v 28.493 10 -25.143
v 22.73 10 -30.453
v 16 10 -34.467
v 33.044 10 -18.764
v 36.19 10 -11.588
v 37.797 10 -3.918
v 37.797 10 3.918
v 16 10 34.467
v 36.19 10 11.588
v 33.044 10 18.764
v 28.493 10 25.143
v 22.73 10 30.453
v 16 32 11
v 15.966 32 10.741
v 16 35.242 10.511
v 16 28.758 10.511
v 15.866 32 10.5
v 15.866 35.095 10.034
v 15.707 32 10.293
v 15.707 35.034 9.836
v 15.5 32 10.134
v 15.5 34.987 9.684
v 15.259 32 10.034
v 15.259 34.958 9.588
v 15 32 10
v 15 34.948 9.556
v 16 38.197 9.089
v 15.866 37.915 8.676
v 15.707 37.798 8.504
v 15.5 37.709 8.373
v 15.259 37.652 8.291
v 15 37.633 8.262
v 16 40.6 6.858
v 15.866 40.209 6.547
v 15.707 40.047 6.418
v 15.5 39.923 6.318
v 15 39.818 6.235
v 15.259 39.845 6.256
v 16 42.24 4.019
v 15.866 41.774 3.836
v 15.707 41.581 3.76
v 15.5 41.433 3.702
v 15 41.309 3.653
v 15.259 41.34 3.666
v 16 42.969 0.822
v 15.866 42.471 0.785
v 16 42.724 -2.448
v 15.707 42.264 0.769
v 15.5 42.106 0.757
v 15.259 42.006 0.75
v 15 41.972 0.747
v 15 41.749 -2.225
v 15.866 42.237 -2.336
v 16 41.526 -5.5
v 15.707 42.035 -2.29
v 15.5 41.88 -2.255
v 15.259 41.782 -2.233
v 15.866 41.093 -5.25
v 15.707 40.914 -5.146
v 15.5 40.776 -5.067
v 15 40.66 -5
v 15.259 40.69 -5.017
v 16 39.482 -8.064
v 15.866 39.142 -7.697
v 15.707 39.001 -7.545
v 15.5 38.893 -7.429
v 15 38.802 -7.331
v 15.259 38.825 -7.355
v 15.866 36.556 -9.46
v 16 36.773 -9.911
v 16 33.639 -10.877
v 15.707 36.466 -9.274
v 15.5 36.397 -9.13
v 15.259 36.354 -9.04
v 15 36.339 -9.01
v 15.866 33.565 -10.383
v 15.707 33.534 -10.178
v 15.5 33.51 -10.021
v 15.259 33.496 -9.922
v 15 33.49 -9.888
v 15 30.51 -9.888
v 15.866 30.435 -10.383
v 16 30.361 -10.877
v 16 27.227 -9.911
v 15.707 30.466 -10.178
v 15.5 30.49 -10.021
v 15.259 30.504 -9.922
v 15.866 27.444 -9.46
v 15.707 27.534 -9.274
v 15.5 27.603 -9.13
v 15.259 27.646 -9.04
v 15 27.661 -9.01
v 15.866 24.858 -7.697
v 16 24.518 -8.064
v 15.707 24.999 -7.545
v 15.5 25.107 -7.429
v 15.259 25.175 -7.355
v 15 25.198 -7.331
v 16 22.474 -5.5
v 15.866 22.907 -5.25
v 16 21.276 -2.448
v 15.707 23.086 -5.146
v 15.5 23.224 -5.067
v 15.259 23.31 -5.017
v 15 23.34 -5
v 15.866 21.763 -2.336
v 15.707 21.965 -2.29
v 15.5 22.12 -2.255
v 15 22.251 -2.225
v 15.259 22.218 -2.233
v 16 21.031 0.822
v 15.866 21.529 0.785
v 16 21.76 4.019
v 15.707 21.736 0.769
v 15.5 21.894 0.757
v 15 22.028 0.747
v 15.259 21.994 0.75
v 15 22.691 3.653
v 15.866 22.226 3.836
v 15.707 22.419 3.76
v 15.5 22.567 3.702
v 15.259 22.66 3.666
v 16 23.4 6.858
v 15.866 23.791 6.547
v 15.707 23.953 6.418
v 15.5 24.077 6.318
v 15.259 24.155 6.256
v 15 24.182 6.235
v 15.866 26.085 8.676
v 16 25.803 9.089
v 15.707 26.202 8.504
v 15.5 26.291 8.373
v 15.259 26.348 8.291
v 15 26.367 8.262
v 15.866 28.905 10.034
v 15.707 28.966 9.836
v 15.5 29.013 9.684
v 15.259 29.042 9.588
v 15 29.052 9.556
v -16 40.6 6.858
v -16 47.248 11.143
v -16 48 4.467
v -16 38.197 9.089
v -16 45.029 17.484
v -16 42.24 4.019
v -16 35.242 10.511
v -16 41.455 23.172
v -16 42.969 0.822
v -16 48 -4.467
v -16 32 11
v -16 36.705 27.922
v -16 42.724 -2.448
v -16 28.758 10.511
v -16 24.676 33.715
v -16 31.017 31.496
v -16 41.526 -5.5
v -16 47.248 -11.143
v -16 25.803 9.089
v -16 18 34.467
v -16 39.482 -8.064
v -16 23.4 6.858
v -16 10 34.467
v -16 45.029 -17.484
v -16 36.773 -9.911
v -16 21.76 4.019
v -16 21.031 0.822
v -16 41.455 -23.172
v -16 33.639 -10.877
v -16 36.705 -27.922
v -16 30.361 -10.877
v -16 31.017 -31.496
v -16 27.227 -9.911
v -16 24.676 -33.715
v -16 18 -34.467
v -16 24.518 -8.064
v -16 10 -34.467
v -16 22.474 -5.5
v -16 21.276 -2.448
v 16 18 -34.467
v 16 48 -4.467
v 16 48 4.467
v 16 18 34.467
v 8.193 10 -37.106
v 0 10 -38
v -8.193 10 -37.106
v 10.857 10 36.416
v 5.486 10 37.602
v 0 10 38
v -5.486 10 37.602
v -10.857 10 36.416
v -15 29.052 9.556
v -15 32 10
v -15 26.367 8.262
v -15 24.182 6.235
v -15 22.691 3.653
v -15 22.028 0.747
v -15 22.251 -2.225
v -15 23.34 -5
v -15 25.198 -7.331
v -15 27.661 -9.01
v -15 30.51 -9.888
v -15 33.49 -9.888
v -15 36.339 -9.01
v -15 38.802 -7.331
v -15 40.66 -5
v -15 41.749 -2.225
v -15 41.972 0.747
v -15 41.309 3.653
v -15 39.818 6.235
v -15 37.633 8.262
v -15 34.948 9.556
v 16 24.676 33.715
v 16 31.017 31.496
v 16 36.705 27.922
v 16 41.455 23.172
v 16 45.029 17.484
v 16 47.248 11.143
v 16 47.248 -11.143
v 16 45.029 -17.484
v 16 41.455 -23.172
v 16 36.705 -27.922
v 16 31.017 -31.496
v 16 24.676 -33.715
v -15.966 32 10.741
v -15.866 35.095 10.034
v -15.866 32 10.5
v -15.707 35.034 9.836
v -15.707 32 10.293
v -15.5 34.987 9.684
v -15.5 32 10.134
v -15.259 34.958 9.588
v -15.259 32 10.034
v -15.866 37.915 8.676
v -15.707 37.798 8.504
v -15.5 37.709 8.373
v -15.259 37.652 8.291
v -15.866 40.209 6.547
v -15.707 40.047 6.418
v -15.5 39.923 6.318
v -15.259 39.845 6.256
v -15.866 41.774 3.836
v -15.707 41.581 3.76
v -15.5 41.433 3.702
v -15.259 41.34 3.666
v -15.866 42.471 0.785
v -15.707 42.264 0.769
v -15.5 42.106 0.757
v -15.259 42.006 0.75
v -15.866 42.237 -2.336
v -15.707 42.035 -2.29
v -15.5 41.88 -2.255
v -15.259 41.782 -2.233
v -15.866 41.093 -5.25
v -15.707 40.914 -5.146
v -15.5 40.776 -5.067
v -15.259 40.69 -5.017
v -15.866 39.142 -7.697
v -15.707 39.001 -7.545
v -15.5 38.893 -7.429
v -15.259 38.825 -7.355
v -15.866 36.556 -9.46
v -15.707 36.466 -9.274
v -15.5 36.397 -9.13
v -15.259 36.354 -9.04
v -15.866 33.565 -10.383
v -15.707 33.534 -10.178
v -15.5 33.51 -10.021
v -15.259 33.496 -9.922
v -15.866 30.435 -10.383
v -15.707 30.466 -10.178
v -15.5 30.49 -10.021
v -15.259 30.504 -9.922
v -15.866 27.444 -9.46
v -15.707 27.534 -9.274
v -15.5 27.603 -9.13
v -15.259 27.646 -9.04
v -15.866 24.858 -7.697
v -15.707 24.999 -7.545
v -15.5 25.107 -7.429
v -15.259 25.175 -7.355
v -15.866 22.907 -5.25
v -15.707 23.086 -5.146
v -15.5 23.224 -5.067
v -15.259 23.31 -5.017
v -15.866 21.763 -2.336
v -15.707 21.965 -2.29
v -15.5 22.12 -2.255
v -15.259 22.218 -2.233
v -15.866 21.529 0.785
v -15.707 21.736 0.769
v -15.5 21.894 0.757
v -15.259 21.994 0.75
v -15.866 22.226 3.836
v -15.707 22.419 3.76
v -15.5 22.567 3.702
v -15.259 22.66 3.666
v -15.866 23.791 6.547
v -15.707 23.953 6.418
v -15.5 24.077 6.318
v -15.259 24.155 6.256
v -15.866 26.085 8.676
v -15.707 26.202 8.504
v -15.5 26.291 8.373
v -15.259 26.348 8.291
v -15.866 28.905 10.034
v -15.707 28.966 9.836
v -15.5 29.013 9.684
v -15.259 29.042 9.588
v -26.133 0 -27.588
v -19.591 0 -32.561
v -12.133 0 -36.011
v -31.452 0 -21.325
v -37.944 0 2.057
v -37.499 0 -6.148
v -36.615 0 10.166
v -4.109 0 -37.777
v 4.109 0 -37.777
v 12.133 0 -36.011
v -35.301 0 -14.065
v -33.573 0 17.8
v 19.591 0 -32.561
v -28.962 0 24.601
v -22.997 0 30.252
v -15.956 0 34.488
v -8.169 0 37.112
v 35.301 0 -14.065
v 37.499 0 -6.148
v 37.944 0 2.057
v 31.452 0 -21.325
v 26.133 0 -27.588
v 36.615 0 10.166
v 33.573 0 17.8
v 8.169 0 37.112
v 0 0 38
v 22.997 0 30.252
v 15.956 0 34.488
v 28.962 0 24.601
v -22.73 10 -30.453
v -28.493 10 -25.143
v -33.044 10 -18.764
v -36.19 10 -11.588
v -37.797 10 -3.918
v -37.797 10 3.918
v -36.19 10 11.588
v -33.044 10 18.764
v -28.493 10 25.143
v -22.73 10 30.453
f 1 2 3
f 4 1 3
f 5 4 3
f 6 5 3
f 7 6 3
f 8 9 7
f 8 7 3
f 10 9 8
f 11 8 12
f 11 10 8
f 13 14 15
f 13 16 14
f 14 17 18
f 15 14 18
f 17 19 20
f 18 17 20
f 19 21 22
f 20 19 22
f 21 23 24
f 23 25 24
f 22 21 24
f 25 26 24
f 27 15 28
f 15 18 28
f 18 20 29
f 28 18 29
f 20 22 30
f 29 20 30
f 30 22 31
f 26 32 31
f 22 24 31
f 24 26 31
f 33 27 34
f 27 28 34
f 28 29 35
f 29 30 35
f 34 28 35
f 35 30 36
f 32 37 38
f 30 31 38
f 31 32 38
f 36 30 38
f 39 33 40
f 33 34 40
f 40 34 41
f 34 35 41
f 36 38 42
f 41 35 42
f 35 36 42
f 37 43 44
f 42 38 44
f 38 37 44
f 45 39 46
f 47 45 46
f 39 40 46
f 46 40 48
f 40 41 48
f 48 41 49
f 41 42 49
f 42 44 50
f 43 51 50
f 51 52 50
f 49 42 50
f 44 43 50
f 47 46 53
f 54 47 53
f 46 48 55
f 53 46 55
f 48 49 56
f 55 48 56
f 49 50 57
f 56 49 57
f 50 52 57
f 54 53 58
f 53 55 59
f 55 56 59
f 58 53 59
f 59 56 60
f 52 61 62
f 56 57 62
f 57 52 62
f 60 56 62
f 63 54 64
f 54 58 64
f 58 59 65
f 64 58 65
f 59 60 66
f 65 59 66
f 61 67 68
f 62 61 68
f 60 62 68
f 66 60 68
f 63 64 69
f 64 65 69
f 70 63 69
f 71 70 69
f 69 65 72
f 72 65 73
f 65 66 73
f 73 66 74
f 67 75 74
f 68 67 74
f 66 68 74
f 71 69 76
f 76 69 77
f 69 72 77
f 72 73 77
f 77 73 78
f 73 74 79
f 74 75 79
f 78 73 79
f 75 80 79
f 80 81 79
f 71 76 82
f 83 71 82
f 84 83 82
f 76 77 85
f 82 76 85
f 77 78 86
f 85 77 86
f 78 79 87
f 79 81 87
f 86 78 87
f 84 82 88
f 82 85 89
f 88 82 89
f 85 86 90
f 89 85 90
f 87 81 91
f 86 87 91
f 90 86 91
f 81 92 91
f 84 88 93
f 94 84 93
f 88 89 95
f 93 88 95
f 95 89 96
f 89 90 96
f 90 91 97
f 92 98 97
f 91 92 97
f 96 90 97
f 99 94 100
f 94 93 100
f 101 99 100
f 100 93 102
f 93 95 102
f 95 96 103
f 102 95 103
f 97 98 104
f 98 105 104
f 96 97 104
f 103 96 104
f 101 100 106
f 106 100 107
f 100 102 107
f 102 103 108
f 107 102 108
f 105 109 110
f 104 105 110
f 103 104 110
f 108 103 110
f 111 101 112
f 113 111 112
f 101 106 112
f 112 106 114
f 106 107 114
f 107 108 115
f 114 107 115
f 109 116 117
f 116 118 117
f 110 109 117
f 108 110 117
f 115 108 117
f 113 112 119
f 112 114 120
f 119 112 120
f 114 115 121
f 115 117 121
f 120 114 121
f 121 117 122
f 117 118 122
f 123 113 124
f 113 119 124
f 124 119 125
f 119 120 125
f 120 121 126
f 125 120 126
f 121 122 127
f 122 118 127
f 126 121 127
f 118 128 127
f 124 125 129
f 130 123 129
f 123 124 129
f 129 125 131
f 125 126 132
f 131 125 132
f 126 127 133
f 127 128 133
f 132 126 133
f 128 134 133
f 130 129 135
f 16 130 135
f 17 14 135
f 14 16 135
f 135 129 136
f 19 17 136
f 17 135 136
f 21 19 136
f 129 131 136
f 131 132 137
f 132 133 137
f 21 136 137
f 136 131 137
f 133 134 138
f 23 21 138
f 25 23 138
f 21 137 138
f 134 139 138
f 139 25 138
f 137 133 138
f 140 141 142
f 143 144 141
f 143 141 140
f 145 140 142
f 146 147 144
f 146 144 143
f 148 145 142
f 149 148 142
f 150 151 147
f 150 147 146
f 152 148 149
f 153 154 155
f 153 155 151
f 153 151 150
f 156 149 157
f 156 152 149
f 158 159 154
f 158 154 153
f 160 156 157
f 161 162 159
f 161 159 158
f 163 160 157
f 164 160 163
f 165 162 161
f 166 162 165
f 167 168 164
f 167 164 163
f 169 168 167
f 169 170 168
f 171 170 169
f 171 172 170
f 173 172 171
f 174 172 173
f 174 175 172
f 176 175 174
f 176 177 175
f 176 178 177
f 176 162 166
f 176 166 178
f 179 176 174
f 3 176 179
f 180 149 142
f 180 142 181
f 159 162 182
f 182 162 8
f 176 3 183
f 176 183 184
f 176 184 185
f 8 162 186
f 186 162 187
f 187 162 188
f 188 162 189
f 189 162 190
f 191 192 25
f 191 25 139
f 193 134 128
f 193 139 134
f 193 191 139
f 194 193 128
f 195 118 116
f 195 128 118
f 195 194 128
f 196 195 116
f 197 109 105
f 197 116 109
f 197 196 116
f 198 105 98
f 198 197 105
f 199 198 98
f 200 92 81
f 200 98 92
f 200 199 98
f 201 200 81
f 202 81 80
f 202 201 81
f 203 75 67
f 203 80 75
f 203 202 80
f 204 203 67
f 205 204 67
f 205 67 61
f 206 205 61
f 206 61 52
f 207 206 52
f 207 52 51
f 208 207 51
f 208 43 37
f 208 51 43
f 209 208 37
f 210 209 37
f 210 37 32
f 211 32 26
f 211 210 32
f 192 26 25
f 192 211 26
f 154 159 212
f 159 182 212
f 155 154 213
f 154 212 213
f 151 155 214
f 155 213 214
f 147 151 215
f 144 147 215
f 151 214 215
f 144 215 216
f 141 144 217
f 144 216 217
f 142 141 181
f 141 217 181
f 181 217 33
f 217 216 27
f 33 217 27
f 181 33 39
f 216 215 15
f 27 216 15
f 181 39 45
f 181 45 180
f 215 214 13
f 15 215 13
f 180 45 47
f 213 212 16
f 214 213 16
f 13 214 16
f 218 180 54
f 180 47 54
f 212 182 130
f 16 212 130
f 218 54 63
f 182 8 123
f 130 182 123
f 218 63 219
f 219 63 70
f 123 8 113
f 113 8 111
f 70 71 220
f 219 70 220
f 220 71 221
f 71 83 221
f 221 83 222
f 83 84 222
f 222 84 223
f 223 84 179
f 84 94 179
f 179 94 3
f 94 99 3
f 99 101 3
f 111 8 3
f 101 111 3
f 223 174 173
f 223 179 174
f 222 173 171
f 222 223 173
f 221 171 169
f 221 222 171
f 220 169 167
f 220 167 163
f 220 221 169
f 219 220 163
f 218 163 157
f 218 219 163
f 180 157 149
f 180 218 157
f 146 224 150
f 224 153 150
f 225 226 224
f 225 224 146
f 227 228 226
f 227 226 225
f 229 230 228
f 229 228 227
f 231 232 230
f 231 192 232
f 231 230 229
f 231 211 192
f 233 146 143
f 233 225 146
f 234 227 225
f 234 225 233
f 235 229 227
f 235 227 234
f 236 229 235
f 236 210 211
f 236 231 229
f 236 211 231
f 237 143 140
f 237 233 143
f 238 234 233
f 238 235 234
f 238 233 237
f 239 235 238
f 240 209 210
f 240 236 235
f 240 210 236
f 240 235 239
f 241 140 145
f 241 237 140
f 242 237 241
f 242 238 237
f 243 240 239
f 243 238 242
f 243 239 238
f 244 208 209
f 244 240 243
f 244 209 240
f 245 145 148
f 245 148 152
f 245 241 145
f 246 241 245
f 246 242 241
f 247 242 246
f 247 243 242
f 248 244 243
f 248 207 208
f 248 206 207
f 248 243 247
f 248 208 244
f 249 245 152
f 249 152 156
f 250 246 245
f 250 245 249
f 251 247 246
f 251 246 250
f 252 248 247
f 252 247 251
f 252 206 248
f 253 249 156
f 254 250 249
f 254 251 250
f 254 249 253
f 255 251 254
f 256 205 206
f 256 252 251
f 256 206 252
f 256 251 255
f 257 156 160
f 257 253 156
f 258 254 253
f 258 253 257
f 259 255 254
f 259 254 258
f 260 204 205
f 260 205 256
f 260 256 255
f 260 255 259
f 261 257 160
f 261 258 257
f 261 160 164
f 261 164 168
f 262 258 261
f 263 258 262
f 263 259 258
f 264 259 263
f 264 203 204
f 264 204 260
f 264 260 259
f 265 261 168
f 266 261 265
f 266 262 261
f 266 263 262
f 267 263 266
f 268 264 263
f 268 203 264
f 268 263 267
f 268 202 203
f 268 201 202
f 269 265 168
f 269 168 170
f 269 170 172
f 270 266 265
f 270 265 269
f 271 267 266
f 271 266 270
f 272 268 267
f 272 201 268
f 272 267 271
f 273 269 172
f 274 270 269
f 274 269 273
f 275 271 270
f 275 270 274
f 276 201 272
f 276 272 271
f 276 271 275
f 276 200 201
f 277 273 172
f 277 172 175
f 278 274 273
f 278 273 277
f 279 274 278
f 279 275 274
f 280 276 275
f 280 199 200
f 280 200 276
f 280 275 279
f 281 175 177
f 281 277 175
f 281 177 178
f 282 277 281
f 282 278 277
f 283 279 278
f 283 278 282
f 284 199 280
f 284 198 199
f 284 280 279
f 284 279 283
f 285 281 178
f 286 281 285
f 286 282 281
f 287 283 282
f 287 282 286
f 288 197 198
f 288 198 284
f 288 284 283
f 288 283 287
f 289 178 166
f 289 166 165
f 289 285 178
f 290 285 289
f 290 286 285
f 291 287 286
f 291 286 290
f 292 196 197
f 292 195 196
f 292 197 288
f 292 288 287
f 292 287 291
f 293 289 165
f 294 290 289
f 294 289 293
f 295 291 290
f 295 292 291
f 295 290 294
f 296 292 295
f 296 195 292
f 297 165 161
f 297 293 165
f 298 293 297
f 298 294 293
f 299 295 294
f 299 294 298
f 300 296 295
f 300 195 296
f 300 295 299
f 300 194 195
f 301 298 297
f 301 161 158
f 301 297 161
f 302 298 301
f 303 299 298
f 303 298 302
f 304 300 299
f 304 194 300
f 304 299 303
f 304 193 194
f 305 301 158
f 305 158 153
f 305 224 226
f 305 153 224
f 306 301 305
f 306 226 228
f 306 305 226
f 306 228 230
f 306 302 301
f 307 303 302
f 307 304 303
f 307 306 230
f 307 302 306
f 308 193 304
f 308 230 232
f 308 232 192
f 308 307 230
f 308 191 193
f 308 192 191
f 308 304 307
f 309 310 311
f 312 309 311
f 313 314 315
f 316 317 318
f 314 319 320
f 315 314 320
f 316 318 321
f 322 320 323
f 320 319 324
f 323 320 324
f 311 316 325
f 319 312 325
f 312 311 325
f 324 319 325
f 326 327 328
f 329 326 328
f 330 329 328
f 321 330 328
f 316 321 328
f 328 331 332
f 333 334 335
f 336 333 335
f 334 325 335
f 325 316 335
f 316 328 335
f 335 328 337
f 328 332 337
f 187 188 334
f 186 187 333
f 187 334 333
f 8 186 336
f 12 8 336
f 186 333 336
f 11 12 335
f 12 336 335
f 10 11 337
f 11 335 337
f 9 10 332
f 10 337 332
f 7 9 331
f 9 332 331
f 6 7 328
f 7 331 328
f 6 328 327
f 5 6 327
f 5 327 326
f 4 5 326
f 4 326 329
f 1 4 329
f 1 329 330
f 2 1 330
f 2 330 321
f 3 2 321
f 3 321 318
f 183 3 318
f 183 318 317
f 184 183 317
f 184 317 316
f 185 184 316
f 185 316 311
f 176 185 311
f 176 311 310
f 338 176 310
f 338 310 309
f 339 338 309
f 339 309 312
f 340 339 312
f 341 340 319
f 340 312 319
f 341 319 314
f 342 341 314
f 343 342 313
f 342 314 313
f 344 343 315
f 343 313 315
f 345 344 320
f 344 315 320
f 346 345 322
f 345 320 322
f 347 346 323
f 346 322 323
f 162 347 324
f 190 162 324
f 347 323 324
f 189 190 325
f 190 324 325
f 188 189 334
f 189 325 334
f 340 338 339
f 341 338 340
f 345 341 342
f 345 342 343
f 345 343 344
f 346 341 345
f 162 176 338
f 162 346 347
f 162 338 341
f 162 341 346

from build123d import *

# Parameters (mm, degrees)
SKETCH1_R               = 38
BOSS_EXTRUDE1_DEPTH     = 10
SKETCH2_W               = 32
SKETCH2_H               = 68.934751758
BOSS_EXTRUDE2_DEPTH     = 38
CUT_EXTRUDE1_DEPTH      = 38
CUT_EXTRUDE1_DEPTH_BACK = 38
SKETCH3_R               = 10
FILLET3_R               = 30
FILLET6_R               = 1


with BuildPart() as part:
    # Sketch1 → Boss-Extrude1 (new body)
    with BuildSketch(Plane(origin=(0, 0, 0), x_dir=(1, 0, 0), z_dir=(0, 1, 0))):
        with Locations(Location((0, 0, 0), (0, 0, 270))):
            Circle(SKETCH1_R)
    extrude(amount=BOSS_EXTRUDE1_DEPTH)

    # Sketch2 → Boss-Extrude2 (add)
    with BuildSketch(Plane(origin=(0, 10, 0), x_dir=(1, 0, 0), z_dir=(0, 1, 0))):
        Rectangle(SKETCH2_W, SKETCH2_H)
    extrude(amount=BOSS_EXTRUDE2_DEPTH)

    # Sketch3 → Cut-Extrude1 (cut, two sides: drawn at the far end of the back side and taken through both)
    with BuildSketch(Plane(origin=(0, 0, 0), x_dir=(0, 0, -1), z_dir=(1, 0, 0)).offset(-CUT_EXTRUDE1_DEPTH_BACK)):
        with Locations(Location((0, 32, 0), (0, 0, 180))):
            Circle(SKETCH3_R)
    extrude(amount=CUT_EXTRUDE1_DEPTH + CUT_EXTRUDE1_DEPTH_BACK, mode=Mode.SUBTRACT)

    # Fillet3
    fillet3_edges = [part.edges().sort_by_distance(p)[0] for p in [
        (0, 48, -34.467375879),
        (0, 48, 34.467375879),
    ]]
    fillet(fillet3_edges, radius=FILLET3_R)

    # Fillet6
    fillet6_edges = [part.edges().sort_by_distance(p)[0] for p in [
        (16, 32, -10),
        (-16, 32, -10),
    ]]
    fillet(fillet6_edges, radius=FILLET6_R)


solid = part.part
